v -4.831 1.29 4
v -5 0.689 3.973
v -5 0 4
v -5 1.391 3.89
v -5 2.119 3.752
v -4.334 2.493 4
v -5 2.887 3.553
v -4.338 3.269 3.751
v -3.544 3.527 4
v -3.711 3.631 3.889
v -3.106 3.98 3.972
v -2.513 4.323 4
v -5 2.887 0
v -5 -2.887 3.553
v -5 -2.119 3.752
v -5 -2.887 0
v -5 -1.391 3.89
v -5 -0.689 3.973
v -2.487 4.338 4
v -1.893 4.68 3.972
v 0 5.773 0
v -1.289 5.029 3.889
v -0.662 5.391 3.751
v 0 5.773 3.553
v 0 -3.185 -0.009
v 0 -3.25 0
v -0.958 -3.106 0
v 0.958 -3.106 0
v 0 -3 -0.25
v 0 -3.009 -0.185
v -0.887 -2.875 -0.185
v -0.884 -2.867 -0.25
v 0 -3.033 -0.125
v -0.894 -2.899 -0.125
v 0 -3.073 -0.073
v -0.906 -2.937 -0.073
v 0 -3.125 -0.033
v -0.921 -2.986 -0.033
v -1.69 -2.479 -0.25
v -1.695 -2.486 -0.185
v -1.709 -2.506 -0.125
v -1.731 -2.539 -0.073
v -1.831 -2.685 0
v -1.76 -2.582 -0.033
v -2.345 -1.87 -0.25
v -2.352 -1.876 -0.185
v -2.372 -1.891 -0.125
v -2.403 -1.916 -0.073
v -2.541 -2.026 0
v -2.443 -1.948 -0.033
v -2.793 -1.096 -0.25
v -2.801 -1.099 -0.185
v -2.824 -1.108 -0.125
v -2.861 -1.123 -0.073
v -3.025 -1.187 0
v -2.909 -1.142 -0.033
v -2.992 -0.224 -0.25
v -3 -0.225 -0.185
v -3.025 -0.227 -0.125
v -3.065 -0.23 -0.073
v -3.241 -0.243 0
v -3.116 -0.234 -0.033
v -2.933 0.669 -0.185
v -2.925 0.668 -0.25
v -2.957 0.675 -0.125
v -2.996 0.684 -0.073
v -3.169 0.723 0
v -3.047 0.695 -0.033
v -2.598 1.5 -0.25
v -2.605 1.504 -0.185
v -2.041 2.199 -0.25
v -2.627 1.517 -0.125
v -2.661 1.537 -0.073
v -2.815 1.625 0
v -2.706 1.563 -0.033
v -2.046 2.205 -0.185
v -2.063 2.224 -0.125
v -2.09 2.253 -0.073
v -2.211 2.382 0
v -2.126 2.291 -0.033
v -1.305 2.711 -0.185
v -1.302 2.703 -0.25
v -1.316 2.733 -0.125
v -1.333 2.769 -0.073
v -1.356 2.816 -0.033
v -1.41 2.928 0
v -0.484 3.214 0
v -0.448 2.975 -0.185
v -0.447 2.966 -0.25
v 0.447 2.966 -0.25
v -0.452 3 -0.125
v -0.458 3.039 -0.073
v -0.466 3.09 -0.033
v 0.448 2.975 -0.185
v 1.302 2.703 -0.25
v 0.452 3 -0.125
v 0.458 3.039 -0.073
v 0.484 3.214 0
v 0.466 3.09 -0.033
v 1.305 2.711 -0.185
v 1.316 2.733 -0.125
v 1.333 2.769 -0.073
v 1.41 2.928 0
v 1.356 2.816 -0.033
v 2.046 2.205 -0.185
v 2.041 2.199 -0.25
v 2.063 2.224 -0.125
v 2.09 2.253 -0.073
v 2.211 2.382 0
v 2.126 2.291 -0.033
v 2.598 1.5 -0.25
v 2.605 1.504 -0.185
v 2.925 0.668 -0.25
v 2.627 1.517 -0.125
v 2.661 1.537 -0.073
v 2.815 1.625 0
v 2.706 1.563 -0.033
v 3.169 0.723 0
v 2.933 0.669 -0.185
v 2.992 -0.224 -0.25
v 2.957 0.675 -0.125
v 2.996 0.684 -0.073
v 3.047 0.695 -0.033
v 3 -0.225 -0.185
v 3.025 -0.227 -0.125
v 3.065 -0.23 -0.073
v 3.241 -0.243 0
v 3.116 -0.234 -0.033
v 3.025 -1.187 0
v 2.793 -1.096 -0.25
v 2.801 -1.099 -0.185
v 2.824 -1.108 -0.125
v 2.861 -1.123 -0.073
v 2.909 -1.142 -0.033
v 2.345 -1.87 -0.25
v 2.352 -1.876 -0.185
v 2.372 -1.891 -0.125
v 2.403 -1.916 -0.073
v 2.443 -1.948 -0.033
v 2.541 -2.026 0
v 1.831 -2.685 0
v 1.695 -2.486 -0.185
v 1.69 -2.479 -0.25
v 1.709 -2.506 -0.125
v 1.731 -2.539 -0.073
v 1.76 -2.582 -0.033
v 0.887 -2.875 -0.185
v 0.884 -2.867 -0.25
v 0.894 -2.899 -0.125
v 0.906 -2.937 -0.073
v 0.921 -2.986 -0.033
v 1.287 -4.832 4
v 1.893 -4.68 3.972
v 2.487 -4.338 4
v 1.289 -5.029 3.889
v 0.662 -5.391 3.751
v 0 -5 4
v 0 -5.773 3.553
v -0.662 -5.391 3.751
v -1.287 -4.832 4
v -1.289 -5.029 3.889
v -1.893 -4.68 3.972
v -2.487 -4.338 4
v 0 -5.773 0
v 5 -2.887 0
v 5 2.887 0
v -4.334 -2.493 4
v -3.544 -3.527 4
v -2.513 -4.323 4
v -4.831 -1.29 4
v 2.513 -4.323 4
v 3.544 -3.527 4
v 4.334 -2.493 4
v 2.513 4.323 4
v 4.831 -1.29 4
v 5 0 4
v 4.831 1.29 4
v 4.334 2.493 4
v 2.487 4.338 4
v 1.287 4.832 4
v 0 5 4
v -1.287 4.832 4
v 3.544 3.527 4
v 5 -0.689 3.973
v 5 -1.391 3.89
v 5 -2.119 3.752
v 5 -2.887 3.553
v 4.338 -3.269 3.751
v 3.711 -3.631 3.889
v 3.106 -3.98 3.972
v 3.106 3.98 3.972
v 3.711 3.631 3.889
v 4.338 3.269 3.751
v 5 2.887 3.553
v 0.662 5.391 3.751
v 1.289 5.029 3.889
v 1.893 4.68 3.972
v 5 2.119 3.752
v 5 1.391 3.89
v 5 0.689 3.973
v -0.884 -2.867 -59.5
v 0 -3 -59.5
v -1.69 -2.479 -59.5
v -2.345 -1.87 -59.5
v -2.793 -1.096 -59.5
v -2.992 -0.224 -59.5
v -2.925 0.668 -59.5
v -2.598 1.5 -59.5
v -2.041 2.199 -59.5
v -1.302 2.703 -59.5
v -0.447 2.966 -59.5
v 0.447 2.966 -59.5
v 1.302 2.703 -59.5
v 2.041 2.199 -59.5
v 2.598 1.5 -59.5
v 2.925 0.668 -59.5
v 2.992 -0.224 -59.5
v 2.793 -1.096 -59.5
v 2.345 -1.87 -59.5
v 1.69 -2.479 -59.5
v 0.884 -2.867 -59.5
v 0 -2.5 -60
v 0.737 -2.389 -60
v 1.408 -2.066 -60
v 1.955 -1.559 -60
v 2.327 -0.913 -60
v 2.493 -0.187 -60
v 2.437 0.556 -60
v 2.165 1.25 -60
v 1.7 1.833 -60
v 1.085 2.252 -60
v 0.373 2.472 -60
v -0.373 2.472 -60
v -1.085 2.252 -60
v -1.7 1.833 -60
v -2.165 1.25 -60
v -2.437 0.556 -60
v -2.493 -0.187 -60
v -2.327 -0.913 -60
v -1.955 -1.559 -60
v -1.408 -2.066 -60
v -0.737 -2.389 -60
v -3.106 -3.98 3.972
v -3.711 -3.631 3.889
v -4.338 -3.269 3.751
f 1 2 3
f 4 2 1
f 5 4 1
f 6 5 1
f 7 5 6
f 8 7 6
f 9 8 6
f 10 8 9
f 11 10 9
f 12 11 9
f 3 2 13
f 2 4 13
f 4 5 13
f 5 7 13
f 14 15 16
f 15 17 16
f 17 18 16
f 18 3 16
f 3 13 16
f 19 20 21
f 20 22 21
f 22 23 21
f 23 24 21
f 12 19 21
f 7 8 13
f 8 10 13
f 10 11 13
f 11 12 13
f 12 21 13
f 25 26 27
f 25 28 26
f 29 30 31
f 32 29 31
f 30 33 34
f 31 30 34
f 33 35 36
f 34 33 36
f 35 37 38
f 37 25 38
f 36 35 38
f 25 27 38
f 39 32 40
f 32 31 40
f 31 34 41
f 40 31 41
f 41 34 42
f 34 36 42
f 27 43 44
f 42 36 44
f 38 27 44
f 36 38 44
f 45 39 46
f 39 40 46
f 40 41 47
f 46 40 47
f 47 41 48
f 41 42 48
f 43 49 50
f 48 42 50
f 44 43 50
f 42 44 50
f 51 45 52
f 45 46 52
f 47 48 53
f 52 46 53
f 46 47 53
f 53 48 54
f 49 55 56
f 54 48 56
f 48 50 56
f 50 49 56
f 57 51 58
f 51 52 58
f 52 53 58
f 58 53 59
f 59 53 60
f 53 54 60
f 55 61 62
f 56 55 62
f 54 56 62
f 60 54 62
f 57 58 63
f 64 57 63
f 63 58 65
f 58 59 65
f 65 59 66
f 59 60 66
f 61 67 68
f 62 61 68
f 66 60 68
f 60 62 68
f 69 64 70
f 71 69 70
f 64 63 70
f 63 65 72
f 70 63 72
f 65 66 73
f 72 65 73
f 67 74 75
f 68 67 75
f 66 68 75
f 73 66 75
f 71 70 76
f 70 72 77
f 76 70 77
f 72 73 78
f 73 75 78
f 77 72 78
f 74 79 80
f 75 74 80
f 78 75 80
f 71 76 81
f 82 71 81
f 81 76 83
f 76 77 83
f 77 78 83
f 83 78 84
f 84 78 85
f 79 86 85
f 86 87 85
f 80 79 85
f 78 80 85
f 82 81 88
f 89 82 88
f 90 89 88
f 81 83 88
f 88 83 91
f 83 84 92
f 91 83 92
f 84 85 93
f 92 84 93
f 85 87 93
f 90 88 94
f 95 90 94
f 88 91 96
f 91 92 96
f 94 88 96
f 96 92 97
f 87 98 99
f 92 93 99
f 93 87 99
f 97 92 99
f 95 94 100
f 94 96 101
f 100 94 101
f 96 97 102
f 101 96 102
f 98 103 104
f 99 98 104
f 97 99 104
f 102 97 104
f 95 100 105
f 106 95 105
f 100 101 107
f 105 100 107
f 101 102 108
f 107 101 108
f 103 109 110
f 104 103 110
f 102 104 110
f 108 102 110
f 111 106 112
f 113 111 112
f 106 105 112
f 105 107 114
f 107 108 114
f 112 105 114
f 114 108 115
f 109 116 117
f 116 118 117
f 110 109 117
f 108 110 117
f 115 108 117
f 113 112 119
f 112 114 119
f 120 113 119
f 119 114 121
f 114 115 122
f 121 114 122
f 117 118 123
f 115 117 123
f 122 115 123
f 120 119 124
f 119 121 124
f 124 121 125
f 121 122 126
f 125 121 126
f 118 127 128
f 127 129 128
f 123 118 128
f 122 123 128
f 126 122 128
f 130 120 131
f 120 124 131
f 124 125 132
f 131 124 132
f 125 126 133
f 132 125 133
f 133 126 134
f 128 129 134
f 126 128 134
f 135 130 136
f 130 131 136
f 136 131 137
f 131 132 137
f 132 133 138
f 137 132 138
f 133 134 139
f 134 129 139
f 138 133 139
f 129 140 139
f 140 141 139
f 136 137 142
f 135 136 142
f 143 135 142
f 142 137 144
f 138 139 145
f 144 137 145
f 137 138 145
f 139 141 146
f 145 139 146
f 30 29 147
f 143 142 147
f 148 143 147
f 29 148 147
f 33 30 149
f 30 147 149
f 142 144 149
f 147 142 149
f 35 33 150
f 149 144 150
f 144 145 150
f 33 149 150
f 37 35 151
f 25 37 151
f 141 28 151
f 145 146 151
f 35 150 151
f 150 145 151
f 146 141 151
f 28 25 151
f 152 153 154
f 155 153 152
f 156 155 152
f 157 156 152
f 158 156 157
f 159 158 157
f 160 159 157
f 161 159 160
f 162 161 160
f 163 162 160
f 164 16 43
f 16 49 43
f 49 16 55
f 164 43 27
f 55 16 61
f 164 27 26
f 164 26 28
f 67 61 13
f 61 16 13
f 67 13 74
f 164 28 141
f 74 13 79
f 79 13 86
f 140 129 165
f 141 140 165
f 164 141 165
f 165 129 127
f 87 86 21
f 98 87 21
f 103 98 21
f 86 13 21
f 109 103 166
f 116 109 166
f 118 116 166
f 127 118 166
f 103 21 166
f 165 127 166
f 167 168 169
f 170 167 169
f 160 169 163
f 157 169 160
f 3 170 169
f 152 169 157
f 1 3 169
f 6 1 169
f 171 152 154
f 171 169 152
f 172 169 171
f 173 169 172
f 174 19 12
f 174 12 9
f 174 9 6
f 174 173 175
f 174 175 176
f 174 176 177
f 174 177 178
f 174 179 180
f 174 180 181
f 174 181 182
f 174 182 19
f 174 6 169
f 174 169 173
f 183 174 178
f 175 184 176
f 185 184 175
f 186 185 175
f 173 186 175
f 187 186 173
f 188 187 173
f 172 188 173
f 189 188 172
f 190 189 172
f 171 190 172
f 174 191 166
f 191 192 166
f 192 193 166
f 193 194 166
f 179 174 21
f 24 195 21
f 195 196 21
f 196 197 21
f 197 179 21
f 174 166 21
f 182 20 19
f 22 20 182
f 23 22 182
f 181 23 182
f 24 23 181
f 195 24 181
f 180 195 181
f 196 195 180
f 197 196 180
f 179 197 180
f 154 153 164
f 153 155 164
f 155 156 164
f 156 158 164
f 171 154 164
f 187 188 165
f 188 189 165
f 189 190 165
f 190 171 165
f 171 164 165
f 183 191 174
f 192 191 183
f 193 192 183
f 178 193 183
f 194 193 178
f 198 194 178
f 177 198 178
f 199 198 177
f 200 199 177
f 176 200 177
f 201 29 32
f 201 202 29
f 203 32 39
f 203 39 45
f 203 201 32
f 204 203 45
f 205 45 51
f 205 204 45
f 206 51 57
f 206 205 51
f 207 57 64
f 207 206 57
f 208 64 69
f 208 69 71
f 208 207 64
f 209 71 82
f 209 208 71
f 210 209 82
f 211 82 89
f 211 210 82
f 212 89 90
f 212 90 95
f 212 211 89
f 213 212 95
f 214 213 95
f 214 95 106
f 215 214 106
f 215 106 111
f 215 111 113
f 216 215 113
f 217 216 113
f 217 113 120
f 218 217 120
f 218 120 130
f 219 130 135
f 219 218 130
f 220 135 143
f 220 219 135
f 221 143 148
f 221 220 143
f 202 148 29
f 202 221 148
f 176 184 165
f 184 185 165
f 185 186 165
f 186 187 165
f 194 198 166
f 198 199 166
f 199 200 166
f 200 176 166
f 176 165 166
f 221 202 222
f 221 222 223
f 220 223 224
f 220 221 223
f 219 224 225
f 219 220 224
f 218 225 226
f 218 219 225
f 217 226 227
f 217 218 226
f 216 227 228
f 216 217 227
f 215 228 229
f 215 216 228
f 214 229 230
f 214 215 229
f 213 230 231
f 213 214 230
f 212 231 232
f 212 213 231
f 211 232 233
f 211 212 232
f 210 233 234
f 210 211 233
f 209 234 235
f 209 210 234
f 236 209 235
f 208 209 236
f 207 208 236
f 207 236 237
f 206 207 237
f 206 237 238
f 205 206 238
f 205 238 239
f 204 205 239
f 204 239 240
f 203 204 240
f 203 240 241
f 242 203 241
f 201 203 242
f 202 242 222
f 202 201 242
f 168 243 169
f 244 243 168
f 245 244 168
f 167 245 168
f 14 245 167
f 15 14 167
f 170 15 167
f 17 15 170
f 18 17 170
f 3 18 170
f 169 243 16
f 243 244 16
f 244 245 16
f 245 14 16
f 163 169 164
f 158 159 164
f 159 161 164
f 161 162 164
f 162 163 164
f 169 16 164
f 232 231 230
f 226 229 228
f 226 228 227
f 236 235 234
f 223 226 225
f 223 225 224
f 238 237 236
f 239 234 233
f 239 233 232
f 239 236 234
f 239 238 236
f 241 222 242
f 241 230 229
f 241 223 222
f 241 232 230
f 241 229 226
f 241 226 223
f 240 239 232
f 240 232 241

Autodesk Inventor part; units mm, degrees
ref_plane "WorkPlane1" through (0, 0, 0) normal (0, 0, 1) x (1, 0, 0)
sketch "Sketch1" plane through (0, 0, 0) normal (0, 0, 1) x (1, 0, 0)
  point P0 (0, 0)
sketch "Sketch2" plane through (0, 0, 0) normal (0, 0, 1) x (1, 0, 0)
  line L0 (-5, 2.8868) -> (-5, -2.8868)
  line L1 (0, 5.7734) -> (-5, 2.8868)
  line L2 (5, 2.8868) -> (0, 5.7734)
  line L3 (5, -2.8868) -> (5, 2.8868)
  line L4 (0, -5.7734) -> (5, -2.8868)
  line L5 (-5, -2.8868) -> (0, -5.7734)
  circle A0 centre (0, 0) radius 5 construction
  dimension "d1" = 10
  dimension "d29" = 0
  dimension "d30" = 0
extrude "Extrusion1" add sketch "Sketch2" along normal blind 4
sketch "Sketch3" plane through (0, 0, 0) normal (1, 0, 0) x (0, 1, 0)
  line L0 (5, 4) -> (5.8734, 4)
  line L1 (5.8734, 3.4957) -> (5, 4)
  line L2 (5.8734, 4) -> (5.8734, 3.4957)
  line L3 (0, -0.8) -> (0, 4.8) projected
  line L4 (5.7734, 0) -> (5.7734, 4) projected
  dimension "d25" = 0.1
  dimension "d26" = 0
  dimension "d27" = 60
  dimension "d28" = 5
revolve "Revolution1" cut sketch "Sketch3" angle 360 about axis through (0, 0, -10) along (0, 0, 1)
sketch "Sketch4" plane through (0, 0, 0) normal (1, 0, 0) x (0, 1, 0)
  line L0 (0, -60) -> (0, 0)
  line L1 (-3, -60) -> (0, -60)
  line L2 (-3, 0) -> (-3, -60)
  line L3 (0, 0) -> (-3, 0)
  line L4 (0, -60) -> (0, 0)
  line L5 (-3.6, 0) -> (0.6, 0) projected
  line L6 (0, -72) -> (0, 12) projected
  dimension "d18" = 3
  dimension "d20" = 60
  dimension "d33" = 0
  dimension "d34" = 0
revolve "Revolution2" add sketch "Sketch4" angle 360 about axis through (0, 0, -60) along (0, 0, -1)
chamfer "Chamfer1" distance 0.5 angle 45 1 edges at (0, 3, -60)
fillet "Fillet1" radius 0.25 1 edges at (0, 3, 0)
thread "Thread1" size "M6x1" class "6g" standard "ISO Metric profile" length 58
ref_plane "MSC_PF1" through (0, 0, 0) normal (1, 0, 0) x (0, 1, 0)
ref_plane "MSC_PT1" through (0, 0, 0) normal (0, 0, -1) x (-1, 0, 0)
equation "\"d22\" = 0.5 * PTC"
equation "\"d23\" = 0.5 * PTC"
equation "\"d24\" = r"
equation "\"d1\" = ParS"
equation "\"d6\" = ParK"
equation "\"b\" = NLG - 2 * PTC"
equation "\"d28\" = 0.5 * ParS"
equation "\"d18\" = 0.5 * NND"
equation "\"d20\" = NLG"
equation "\"NND\" = 6"
equation "\"NLG\" = 60"
equation "\"PTC\" = 1"
equation "\"ParK\" = 4"
equation "\"ParS\" = 10"
equation "\"msp_es\" = 0.577367 * ParS"
equation "\"r\" = 0.25"
equation "\"THREADDIA\" = NND"
properties part number "ISO 4018 - M6 x 60" material "Steel"
